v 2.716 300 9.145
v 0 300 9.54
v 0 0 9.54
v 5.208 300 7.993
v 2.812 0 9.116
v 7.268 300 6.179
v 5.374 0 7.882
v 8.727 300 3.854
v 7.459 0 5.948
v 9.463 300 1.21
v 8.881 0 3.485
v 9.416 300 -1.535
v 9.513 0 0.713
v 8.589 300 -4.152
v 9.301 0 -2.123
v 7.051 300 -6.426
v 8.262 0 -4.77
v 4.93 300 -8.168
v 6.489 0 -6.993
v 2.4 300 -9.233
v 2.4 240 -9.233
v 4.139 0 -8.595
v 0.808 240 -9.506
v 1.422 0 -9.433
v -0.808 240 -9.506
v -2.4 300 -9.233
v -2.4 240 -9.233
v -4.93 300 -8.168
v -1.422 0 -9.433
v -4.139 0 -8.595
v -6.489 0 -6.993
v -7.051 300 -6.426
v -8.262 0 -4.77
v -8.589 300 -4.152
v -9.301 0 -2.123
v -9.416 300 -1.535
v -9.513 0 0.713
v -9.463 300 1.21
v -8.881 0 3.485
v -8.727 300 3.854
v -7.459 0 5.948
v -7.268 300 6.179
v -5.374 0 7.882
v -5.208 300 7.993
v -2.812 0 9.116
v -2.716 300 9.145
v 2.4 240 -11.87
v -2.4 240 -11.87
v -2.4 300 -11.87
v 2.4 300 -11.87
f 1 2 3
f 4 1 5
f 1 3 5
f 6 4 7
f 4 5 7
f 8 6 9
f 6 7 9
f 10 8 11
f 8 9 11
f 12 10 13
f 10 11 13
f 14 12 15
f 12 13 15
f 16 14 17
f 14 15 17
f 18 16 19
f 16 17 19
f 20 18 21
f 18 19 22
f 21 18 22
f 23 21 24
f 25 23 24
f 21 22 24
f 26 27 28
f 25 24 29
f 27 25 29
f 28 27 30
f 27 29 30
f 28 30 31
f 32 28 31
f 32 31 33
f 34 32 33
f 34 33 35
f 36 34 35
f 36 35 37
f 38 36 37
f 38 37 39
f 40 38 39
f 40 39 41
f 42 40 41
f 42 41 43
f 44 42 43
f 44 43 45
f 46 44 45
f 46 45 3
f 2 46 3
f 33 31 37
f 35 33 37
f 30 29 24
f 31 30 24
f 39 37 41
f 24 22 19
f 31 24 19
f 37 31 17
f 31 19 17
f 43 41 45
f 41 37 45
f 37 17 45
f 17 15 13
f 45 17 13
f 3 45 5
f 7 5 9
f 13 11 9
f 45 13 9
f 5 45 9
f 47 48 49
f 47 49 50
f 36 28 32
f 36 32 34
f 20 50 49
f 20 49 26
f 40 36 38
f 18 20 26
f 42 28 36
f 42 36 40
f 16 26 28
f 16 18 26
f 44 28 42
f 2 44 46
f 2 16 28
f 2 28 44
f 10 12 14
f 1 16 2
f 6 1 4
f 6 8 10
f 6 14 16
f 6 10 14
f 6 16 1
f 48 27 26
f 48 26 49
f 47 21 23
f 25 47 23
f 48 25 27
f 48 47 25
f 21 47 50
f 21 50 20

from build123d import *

# Parameters (mm, degrees)
SKETCH1_R           = 9.54
BOSS_EXTRUDE1_DEPTH = 300
BOSS_EXTRUDE2_START = -60
BOSS_EXTRUDE2_DEPTH = 60


with BuildPart() as part:
    # Sketch1 → Boss-Extrude1 (new body)
    with BuildSketch(Plane(origin=(0, 0, 0), x_dir=(1, 0, 0), z_dir=(0, 1, 0))):
        with Locations(Location((0, 0, 0), (0, 0, 270))):
            Circle(SKETCH1_R)
    extrude(amount=BOSS_EXTRUDE1_DEPTH)

    # Sketch2 → Boss-Extrude2 (add)
    with BuildSketch(Plane(origin=(0, 300, 0), x_dir=(1, 0, 0), z_dir=(0, 1, 0)).offset(BOSS_EXTRUDE2_START)):
        with BuildLine():
            Line((-2.4, 9.233179301), (-2.4, 11.87))
            Line((-2.4, 11.87), (2.4, 11.87))
            Line((2.4, 11.87), (2.4, 9.233179301))
            ThreePointArc((2.4, 9.233179301), (0, 9.54), (-2.4, 9.233179301))
        make_face()
    extrude(amount=BOSS_EXTRUDE2_DEPTH)


solid = part.part
